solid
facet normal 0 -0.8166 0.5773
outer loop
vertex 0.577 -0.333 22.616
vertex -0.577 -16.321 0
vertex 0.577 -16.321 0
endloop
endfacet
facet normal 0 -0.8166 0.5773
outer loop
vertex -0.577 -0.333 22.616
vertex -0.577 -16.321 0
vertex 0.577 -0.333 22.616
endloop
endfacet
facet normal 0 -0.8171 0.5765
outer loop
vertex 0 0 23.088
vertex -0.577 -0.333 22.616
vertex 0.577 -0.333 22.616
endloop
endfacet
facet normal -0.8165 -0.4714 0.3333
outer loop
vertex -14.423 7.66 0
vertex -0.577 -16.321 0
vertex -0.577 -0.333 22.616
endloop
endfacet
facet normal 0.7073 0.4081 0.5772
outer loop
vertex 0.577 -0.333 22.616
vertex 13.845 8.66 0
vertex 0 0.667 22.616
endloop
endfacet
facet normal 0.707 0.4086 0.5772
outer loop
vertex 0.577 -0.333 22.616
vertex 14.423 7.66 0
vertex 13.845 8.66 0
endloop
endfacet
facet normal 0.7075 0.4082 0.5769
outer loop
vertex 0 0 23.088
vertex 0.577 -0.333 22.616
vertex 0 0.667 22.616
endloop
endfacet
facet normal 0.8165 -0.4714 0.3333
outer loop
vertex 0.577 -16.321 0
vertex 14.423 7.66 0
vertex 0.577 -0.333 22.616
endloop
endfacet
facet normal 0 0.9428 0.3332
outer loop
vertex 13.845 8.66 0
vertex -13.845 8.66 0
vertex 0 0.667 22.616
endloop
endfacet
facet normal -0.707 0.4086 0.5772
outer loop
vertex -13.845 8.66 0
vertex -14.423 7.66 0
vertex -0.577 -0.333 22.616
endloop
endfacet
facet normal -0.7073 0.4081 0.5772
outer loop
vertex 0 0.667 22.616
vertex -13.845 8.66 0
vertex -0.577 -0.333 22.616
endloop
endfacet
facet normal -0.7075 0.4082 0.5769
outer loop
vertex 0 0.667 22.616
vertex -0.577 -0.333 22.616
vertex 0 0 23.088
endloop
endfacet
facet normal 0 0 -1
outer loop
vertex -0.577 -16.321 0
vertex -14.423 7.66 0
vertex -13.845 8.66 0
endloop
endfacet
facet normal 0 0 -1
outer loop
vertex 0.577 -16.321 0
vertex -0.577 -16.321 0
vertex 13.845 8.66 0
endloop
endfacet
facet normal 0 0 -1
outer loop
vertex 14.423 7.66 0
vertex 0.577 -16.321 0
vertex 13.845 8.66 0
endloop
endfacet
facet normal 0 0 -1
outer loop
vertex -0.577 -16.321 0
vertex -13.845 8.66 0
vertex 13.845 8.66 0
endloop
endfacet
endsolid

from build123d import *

# Parameters (mm, degrees)
F1_DEPTH = 24.495
F1_TAPER = 19.4657
F2_SIZE  = 1


with BuildPart() as f1:
    # F0 (on Top) → F1 (new body)
    with BuildSketch(Plane.XY):
        Polygon((15, 8.6602540378), (-15, 8.6602540378), (0, -17.3205080757), align=None)
    extrude(amount=F1_DEPTH, taper=F1_TAPER)

    # F2 (call 1 of 3: OpenCascade refuses the feature's edges together)
    f2_edges = [f1.edges().sort_by_distance(p)[0] for p in [
        (0, -8.662872, 12.247501),
    ]]
    chamfer(f2_edges, length=F2_SIZE)

    # F2#2 (call 2 of 3)
    f2_2_edges = [f1.edges().sort_by_distance(p)[0] for p in [
        (7.502267, 4.331436, 12.247501),
    ]]
    chamfer(f2_2_edges, length=F2_SIZE)

    # F2#3 (call 3 of 3)
    f2_3_edges = [f1.edges().sort_by_distance(p)[0] for p in [
        (-7.502267, 4.331436, 12.247501),
    ]]
    chamfer(f2_3_edges, length=F2_SIZE)


solid = f1.part
